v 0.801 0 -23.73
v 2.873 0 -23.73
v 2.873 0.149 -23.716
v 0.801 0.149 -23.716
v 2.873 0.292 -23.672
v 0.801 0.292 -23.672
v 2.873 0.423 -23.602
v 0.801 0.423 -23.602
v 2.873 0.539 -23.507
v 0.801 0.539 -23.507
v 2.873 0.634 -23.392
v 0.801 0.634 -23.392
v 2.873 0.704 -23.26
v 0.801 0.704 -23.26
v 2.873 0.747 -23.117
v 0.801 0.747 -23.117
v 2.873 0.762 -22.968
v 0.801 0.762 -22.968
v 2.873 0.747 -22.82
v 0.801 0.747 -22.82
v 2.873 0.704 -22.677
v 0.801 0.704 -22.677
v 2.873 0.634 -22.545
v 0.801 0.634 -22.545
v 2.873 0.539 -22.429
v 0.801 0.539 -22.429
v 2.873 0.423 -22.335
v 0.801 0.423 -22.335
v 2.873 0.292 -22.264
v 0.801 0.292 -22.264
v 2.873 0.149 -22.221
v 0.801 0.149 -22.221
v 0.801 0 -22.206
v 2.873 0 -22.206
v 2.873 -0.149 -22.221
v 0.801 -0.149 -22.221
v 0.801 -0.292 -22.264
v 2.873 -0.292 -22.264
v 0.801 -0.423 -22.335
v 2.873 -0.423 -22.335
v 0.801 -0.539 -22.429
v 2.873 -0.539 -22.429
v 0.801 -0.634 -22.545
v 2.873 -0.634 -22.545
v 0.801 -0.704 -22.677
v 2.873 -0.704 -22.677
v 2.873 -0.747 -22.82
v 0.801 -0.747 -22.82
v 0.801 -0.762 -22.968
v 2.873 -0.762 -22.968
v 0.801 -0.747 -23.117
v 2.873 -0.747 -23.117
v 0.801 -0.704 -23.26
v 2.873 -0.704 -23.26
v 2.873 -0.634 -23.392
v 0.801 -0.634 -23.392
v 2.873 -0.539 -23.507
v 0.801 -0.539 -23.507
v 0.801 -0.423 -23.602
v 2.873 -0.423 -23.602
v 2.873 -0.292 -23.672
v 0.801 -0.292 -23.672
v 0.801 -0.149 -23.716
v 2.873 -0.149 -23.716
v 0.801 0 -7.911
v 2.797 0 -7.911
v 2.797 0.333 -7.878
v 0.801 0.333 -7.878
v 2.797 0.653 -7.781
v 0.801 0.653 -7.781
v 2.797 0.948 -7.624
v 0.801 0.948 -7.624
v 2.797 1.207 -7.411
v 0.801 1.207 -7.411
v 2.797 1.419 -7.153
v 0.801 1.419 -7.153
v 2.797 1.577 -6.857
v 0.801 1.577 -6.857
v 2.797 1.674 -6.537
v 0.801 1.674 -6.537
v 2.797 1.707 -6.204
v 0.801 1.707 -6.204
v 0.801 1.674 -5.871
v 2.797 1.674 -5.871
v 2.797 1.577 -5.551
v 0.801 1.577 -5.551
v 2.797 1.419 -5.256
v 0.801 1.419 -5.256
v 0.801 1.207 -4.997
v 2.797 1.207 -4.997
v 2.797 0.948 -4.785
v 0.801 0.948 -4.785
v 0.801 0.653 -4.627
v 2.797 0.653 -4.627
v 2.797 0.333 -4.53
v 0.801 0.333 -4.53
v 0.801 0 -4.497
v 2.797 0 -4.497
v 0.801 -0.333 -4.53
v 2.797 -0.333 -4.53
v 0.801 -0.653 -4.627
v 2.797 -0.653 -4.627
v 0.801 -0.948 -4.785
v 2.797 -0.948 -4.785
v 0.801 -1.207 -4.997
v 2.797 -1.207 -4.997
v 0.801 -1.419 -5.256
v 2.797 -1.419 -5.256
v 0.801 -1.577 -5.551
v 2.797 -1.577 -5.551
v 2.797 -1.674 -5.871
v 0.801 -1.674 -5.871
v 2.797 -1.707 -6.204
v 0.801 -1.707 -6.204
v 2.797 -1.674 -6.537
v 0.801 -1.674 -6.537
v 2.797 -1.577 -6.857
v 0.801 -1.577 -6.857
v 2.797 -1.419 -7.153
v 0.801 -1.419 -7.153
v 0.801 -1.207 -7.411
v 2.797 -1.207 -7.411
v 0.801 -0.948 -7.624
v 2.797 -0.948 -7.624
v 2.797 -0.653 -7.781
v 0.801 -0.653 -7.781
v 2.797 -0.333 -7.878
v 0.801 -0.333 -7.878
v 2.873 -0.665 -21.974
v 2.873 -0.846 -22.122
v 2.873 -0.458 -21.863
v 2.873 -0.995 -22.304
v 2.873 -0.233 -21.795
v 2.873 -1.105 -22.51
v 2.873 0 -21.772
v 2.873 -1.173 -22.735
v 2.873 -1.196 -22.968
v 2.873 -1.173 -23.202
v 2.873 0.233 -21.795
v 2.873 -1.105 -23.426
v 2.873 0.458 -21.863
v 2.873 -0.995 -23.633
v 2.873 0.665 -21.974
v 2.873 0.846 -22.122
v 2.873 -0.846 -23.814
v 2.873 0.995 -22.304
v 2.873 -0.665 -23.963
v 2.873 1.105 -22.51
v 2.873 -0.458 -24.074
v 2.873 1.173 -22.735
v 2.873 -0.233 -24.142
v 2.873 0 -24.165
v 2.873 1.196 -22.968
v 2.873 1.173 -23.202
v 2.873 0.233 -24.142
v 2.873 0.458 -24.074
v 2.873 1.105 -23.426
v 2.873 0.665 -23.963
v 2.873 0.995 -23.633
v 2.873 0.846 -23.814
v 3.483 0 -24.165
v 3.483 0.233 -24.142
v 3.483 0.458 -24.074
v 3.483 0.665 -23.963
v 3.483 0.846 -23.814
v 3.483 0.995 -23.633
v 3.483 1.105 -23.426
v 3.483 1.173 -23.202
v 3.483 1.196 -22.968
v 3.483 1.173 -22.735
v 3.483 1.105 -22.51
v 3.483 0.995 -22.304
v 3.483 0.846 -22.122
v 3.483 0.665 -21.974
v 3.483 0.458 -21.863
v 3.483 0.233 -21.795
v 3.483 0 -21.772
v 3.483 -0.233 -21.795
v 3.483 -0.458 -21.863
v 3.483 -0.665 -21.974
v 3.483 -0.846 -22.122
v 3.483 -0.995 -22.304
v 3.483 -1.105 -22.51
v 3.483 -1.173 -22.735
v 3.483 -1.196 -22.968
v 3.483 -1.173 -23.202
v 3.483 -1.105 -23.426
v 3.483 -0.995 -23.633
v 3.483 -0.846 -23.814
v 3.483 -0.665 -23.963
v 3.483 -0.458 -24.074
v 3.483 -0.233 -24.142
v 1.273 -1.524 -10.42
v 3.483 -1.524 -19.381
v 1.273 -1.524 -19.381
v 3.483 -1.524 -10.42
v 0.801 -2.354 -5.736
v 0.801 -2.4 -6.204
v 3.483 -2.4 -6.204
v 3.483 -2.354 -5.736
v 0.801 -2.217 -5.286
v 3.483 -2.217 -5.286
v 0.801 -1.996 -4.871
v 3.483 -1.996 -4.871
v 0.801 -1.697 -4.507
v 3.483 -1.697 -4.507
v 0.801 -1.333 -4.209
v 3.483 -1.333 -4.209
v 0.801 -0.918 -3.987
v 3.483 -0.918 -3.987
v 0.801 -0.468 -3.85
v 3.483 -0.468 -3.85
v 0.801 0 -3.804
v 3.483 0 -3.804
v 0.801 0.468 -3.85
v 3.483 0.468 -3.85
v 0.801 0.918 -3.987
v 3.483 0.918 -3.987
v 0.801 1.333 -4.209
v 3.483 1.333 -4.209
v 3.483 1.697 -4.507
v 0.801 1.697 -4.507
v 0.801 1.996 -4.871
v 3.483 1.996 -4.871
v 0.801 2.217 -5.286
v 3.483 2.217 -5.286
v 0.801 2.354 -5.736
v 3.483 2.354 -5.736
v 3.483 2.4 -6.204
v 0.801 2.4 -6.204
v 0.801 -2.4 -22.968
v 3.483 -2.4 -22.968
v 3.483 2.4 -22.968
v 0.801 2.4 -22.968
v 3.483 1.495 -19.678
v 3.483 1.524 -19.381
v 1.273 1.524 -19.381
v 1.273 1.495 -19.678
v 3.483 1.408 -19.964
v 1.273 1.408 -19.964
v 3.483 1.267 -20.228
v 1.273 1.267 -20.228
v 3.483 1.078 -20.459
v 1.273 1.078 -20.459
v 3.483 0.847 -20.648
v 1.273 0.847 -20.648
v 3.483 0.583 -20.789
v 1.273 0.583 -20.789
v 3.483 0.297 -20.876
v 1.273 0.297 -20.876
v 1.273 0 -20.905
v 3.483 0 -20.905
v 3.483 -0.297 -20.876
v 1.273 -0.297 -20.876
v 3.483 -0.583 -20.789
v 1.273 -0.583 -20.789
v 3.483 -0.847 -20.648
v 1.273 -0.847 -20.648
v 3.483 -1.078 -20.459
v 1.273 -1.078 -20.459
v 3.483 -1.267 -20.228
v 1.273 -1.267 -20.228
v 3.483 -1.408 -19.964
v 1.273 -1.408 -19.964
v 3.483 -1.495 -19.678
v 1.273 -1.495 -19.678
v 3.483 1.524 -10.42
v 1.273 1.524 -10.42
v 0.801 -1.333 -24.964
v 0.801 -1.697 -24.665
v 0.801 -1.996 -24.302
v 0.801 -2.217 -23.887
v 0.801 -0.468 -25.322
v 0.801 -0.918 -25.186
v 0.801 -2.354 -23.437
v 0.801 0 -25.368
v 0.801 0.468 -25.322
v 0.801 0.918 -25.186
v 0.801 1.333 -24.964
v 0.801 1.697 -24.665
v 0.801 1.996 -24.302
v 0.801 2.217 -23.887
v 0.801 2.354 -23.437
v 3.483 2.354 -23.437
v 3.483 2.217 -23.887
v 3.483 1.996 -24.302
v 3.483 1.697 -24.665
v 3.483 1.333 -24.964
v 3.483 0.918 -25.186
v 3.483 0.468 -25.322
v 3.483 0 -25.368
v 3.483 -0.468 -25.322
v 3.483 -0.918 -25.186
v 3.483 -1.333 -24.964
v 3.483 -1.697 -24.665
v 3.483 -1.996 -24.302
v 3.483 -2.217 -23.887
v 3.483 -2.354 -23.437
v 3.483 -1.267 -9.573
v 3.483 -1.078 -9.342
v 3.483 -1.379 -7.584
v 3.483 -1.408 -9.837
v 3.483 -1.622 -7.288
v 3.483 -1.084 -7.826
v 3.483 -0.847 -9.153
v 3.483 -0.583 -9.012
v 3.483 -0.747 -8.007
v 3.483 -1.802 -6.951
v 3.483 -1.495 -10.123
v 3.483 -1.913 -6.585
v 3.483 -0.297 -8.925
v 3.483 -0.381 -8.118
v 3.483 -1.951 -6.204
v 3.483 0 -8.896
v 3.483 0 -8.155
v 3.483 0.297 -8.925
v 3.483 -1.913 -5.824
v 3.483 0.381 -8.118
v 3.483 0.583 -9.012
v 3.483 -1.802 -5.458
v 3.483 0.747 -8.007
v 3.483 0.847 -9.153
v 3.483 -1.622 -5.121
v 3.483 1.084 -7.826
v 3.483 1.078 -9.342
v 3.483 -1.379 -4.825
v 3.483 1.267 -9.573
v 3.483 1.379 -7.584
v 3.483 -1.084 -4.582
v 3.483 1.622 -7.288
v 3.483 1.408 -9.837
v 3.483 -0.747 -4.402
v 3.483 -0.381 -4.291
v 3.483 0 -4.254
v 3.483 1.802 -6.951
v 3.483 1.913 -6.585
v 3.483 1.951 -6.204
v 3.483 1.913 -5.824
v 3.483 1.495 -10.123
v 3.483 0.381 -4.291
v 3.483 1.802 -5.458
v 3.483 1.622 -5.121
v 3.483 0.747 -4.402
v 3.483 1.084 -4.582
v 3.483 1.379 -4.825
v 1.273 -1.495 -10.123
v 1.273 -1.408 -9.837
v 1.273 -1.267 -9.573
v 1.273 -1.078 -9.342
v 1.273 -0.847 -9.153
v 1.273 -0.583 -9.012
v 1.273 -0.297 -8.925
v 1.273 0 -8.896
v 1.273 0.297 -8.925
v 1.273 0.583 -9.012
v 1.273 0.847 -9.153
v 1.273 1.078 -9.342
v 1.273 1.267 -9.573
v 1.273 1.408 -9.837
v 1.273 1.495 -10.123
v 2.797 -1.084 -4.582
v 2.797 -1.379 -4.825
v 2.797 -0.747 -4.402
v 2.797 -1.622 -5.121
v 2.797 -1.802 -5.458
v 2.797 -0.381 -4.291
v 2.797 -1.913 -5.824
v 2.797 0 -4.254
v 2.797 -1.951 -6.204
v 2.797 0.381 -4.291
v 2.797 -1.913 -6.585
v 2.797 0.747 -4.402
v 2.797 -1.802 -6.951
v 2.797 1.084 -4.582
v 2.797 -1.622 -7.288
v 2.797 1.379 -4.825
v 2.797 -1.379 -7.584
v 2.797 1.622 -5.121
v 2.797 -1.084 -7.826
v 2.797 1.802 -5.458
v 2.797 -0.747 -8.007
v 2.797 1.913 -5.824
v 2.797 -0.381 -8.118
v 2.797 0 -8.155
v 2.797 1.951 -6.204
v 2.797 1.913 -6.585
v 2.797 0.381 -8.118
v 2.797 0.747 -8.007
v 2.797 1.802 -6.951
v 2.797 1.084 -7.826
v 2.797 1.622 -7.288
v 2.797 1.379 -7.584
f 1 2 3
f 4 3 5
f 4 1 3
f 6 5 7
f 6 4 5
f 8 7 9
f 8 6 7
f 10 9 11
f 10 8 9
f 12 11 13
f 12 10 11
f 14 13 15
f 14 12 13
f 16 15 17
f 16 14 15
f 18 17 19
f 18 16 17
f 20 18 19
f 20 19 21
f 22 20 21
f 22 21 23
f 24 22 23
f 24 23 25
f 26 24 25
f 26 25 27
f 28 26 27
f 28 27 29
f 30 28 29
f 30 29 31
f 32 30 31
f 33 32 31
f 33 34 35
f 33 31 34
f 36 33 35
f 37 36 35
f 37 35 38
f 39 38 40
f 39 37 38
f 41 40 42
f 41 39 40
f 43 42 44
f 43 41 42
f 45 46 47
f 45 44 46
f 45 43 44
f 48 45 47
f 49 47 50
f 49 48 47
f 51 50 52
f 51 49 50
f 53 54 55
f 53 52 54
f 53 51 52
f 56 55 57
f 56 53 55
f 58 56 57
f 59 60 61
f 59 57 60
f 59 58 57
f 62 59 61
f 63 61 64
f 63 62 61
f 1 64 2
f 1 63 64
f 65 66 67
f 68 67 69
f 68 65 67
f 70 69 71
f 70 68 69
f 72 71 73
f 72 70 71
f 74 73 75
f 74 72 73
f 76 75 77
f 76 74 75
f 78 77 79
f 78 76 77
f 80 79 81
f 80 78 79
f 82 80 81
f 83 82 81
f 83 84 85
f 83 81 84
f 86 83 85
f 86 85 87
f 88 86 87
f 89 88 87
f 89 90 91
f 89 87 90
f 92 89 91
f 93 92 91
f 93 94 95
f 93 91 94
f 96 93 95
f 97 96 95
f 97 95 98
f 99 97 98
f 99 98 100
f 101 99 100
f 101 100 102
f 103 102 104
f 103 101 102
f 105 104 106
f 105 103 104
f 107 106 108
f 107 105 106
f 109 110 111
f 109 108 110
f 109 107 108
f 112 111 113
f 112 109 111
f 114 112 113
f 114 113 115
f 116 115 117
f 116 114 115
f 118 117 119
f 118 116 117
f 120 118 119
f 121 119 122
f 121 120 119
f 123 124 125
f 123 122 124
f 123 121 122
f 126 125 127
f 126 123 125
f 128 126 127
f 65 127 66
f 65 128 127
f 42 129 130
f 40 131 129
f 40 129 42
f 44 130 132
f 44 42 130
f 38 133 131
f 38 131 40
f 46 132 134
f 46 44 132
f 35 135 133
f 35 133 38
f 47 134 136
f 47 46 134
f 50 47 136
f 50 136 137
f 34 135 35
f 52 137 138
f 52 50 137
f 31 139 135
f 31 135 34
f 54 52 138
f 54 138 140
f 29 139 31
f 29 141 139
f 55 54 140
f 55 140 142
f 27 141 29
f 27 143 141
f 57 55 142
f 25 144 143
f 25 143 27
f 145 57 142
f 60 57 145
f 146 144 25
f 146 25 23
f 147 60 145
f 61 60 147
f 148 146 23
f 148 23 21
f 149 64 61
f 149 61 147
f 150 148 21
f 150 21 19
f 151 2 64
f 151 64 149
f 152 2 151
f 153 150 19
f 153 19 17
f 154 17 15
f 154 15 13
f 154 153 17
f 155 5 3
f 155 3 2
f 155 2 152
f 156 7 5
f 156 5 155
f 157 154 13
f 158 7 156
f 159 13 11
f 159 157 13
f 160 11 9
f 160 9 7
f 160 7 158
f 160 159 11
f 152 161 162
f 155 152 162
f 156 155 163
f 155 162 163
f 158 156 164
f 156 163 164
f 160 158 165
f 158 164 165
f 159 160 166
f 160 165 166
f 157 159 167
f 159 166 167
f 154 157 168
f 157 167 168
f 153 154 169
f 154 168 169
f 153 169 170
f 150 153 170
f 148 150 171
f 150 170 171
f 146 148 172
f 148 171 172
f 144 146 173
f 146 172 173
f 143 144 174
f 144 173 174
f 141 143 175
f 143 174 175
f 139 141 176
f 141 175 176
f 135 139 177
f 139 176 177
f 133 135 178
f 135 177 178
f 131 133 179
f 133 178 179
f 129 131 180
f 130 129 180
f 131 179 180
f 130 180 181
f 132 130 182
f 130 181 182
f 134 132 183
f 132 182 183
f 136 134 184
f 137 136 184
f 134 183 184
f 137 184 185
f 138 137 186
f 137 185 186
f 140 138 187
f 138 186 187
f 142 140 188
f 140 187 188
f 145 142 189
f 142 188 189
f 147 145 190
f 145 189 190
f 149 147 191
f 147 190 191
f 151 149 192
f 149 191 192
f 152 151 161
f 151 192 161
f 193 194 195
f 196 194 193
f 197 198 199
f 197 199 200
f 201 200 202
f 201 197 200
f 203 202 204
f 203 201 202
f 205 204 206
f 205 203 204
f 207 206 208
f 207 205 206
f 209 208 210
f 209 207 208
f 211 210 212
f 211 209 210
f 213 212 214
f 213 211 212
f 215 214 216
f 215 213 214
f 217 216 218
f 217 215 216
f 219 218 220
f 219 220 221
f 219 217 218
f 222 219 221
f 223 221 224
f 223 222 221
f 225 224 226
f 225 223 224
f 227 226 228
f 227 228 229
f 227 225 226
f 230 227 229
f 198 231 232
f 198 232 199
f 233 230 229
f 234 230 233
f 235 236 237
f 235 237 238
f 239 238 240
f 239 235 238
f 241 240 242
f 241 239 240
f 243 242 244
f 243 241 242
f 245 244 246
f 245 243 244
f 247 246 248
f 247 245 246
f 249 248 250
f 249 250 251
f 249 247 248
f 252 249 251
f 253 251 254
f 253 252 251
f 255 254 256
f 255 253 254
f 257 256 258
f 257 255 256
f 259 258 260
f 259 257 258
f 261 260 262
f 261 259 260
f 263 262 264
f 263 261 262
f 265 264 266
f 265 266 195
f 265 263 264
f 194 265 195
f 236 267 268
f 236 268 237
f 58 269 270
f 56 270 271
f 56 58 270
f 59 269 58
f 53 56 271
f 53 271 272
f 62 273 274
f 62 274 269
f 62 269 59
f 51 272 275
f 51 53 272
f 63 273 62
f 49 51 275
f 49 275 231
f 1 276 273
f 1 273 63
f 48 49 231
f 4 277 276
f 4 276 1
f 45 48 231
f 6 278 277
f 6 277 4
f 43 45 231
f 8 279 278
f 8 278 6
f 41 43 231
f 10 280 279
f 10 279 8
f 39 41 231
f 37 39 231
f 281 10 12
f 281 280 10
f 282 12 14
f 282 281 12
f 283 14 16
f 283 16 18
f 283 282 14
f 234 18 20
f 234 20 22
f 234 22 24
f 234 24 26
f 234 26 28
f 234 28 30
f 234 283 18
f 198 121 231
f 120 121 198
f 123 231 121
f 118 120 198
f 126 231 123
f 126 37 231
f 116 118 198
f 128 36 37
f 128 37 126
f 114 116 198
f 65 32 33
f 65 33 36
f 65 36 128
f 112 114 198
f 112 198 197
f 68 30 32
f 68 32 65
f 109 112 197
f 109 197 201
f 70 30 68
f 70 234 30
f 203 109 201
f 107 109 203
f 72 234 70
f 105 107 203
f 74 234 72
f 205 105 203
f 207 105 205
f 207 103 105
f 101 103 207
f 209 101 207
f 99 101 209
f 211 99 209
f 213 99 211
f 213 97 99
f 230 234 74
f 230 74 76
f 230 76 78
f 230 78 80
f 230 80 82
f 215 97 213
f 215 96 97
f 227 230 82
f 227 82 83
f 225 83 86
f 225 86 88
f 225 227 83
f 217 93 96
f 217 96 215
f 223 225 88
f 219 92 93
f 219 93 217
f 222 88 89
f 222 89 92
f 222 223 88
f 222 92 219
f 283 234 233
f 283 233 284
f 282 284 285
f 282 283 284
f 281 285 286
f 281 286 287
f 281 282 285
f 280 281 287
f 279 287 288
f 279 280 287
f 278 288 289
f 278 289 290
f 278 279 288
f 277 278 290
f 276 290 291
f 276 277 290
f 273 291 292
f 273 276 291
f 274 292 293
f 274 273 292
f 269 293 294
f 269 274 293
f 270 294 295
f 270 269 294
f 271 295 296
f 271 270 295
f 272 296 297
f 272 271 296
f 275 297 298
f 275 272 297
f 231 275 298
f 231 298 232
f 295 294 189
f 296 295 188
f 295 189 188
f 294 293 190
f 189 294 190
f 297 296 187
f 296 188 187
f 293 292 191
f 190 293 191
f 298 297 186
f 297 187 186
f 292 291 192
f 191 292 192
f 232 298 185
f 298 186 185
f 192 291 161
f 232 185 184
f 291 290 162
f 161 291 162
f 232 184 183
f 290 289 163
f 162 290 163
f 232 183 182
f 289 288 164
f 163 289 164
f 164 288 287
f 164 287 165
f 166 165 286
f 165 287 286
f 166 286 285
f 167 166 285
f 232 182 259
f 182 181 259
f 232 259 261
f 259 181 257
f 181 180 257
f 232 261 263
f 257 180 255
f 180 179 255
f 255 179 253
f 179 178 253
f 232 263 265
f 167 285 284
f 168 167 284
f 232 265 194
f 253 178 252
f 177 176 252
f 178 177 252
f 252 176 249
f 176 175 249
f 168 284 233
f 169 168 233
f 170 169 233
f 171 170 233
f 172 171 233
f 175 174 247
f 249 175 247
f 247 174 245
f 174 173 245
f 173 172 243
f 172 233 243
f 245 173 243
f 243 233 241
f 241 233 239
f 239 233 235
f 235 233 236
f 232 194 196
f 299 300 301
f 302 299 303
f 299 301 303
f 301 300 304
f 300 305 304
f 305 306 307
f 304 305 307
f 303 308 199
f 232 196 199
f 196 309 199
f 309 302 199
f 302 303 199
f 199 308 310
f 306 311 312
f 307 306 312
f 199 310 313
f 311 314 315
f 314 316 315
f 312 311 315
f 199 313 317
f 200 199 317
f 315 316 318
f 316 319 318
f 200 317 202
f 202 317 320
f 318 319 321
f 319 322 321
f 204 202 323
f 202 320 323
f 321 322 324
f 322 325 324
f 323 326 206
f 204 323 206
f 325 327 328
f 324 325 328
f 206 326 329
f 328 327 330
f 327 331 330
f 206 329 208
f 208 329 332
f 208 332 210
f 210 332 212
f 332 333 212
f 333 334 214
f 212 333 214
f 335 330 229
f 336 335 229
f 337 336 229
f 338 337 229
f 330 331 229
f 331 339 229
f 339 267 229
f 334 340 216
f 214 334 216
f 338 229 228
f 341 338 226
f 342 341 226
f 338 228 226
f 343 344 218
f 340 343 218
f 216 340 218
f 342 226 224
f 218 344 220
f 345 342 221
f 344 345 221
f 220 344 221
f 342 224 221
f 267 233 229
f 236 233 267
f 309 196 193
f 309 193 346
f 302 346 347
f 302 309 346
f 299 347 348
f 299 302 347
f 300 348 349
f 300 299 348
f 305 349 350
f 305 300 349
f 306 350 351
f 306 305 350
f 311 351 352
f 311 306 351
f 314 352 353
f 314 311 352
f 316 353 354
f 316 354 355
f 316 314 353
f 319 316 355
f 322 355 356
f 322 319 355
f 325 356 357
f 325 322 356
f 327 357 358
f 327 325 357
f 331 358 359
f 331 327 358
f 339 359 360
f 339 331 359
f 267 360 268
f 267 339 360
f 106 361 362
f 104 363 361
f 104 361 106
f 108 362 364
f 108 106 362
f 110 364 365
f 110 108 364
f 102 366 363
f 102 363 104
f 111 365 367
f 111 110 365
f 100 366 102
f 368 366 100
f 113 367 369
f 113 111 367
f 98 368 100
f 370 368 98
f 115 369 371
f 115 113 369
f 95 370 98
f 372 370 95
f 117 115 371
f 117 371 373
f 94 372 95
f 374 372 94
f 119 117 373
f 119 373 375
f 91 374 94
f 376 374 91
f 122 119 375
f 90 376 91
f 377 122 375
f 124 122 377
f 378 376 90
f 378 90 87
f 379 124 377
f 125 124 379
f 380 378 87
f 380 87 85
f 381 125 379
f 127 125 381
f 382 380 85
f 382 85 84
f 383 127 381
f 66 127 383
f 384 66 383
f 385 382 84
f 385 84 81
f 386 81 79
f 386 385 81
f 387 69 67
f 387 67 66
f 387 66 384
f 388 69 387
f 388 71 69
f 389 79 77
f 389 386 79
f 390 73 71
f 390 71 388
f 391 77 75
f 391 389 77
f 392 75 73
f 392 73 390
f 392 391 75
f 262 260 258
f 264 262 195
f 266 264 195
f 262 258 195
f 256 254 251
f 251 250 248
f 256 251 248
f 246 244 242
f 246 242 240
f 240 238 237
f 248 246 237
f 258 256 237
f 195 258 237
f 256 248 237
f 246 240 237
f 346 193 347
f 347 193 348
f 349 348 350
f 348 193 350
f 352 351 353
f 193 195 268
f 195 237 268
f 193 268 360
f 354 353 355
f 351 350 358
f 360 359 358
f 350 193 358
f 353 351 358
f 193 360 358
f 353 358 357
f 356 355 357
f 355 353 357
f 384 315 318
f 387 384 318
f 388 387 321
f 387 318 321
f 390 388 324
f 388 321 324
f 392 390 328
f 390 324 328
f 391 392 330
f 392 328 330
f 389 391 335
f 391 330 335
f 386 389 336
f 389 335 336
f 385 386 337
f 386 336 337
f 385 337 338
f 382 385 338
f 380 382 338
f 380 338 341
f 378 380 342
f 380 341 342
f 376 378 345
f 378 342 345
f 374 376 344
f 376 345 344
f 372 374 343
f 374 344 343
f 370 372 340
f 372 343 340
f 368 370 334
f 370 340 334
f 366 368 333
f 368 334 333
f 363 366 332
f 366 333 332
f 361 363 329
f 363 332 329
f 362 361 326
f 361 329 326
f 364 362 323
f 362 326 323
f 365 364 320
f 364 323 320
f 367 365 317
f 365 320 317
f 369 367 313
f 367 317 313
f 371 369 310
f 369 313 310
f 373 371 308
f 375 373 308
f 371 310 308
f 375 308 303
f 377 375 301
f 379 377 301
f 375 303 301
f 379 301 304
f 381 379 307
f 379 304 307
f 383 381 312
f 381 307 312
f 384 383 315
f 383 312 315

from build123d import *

# Parameters (mm, degrees)
SKETCH1_R           = 2.8448
SKETCH1_R_2         = 1.27
BOSS_EXTRUDE1_DEPTH = 4.4704
SKETCH2_R           = 3.2512
CUT_EXTRUDE1_DEPTH  = 1.143
SKETCH3_R           = 1.9939
CUT_EXTRUDE2_DEPTH  = 1.016
CUT_EXTRUDE3_DEPTH  = 3.683
SCALE1_SCALE        = 0.6


with BuildPart() as part:
    # Sketch1 → Boss-Extrude1 (new body)
    with BuildSketch(Plane(origin=(0, 0, 0), x_dir=(0, 0, -1), z_dir=(1, 0, 0))):
        with BuildLine():
            Line((0, 4.000000128), (27.94, 4.000000128))
            ThreePointArc((27.94, 4.000000128), (31.940000128, 0), (27.94, -4.000000128))
            Line((27.94, -4.000000128), (0, -4.000000128))
            ThreePointArc((0, -4.000000128), (-4.000000128, 0), (0, 4.000000128))
        make_face()
        Circle(SKETCH1_R, mode=Mode.SUBTRACT)
        with Locations((27.94, 0)):
            Circle(SKETCH1_R_2, mode=Mode.SUBTRACT)
    extrude(amount=BOSS_EXTRUDE1_DEPTH)

    # Sketch2 → Cut-Extrude1 (cut)
    with BuildSketch(Plane(origin=(4.4704, 0, 0), x_dir=(0, 0, -1), z_dir=(1, 0, 0))):
        Circle(SKETCH2_R)
    extrude(amount=-CUT_EXTRUDE1_DEPTH, mode=Mode.SUBTRACT)

    # Sketch3 → Cut-Extrude2 (cut)
    with BuildSketch(Plane(origin=(4.4704, 0, 0), x_dir=(0, 0, -1), z_dir=(1, 0, 0))):
        with Locations((27.94, 0)):
            Circle(SKETCH3_R)
    extrude(amount=-CUT_EXTRUDE2_DEPTH, mode=Mode.SUBTRACT)

    # Sketch4 → Cut-Extrude3 (cut)
    with BuildSketch(Plane(origin=(4.4704, 0, 0), x_dir=(0, 0, -1), z_dir=(1, 0, 0))):
        with BuildLine():
            Line((7.0259921, 2.54), (21.9611921, 2.54))
            ThreePointArc((21.9611921, 2.54), (24.5011921, 0), (21.9611921, -2.54))
            Line((21.9611921, -2.54), (7.0259921, -2.54))
            ThreePointArc((7.0259921, -2.54), (4.4859921, 0), (7.0259921, 2.54))
        make_face()
    extrude(amount=-CUT_EXTRUDE3_DEPTH, mode=Mode.SUBTRACT)


with BuildPart() as part_1:
    # Scale1: scaled about (2.002001382, 0, -15.510759507)
    add(part.part.scale(SCALE1_SCALE).moved(Location((0.800800553, 0, -6.204303803))))


solid = part_1.part
